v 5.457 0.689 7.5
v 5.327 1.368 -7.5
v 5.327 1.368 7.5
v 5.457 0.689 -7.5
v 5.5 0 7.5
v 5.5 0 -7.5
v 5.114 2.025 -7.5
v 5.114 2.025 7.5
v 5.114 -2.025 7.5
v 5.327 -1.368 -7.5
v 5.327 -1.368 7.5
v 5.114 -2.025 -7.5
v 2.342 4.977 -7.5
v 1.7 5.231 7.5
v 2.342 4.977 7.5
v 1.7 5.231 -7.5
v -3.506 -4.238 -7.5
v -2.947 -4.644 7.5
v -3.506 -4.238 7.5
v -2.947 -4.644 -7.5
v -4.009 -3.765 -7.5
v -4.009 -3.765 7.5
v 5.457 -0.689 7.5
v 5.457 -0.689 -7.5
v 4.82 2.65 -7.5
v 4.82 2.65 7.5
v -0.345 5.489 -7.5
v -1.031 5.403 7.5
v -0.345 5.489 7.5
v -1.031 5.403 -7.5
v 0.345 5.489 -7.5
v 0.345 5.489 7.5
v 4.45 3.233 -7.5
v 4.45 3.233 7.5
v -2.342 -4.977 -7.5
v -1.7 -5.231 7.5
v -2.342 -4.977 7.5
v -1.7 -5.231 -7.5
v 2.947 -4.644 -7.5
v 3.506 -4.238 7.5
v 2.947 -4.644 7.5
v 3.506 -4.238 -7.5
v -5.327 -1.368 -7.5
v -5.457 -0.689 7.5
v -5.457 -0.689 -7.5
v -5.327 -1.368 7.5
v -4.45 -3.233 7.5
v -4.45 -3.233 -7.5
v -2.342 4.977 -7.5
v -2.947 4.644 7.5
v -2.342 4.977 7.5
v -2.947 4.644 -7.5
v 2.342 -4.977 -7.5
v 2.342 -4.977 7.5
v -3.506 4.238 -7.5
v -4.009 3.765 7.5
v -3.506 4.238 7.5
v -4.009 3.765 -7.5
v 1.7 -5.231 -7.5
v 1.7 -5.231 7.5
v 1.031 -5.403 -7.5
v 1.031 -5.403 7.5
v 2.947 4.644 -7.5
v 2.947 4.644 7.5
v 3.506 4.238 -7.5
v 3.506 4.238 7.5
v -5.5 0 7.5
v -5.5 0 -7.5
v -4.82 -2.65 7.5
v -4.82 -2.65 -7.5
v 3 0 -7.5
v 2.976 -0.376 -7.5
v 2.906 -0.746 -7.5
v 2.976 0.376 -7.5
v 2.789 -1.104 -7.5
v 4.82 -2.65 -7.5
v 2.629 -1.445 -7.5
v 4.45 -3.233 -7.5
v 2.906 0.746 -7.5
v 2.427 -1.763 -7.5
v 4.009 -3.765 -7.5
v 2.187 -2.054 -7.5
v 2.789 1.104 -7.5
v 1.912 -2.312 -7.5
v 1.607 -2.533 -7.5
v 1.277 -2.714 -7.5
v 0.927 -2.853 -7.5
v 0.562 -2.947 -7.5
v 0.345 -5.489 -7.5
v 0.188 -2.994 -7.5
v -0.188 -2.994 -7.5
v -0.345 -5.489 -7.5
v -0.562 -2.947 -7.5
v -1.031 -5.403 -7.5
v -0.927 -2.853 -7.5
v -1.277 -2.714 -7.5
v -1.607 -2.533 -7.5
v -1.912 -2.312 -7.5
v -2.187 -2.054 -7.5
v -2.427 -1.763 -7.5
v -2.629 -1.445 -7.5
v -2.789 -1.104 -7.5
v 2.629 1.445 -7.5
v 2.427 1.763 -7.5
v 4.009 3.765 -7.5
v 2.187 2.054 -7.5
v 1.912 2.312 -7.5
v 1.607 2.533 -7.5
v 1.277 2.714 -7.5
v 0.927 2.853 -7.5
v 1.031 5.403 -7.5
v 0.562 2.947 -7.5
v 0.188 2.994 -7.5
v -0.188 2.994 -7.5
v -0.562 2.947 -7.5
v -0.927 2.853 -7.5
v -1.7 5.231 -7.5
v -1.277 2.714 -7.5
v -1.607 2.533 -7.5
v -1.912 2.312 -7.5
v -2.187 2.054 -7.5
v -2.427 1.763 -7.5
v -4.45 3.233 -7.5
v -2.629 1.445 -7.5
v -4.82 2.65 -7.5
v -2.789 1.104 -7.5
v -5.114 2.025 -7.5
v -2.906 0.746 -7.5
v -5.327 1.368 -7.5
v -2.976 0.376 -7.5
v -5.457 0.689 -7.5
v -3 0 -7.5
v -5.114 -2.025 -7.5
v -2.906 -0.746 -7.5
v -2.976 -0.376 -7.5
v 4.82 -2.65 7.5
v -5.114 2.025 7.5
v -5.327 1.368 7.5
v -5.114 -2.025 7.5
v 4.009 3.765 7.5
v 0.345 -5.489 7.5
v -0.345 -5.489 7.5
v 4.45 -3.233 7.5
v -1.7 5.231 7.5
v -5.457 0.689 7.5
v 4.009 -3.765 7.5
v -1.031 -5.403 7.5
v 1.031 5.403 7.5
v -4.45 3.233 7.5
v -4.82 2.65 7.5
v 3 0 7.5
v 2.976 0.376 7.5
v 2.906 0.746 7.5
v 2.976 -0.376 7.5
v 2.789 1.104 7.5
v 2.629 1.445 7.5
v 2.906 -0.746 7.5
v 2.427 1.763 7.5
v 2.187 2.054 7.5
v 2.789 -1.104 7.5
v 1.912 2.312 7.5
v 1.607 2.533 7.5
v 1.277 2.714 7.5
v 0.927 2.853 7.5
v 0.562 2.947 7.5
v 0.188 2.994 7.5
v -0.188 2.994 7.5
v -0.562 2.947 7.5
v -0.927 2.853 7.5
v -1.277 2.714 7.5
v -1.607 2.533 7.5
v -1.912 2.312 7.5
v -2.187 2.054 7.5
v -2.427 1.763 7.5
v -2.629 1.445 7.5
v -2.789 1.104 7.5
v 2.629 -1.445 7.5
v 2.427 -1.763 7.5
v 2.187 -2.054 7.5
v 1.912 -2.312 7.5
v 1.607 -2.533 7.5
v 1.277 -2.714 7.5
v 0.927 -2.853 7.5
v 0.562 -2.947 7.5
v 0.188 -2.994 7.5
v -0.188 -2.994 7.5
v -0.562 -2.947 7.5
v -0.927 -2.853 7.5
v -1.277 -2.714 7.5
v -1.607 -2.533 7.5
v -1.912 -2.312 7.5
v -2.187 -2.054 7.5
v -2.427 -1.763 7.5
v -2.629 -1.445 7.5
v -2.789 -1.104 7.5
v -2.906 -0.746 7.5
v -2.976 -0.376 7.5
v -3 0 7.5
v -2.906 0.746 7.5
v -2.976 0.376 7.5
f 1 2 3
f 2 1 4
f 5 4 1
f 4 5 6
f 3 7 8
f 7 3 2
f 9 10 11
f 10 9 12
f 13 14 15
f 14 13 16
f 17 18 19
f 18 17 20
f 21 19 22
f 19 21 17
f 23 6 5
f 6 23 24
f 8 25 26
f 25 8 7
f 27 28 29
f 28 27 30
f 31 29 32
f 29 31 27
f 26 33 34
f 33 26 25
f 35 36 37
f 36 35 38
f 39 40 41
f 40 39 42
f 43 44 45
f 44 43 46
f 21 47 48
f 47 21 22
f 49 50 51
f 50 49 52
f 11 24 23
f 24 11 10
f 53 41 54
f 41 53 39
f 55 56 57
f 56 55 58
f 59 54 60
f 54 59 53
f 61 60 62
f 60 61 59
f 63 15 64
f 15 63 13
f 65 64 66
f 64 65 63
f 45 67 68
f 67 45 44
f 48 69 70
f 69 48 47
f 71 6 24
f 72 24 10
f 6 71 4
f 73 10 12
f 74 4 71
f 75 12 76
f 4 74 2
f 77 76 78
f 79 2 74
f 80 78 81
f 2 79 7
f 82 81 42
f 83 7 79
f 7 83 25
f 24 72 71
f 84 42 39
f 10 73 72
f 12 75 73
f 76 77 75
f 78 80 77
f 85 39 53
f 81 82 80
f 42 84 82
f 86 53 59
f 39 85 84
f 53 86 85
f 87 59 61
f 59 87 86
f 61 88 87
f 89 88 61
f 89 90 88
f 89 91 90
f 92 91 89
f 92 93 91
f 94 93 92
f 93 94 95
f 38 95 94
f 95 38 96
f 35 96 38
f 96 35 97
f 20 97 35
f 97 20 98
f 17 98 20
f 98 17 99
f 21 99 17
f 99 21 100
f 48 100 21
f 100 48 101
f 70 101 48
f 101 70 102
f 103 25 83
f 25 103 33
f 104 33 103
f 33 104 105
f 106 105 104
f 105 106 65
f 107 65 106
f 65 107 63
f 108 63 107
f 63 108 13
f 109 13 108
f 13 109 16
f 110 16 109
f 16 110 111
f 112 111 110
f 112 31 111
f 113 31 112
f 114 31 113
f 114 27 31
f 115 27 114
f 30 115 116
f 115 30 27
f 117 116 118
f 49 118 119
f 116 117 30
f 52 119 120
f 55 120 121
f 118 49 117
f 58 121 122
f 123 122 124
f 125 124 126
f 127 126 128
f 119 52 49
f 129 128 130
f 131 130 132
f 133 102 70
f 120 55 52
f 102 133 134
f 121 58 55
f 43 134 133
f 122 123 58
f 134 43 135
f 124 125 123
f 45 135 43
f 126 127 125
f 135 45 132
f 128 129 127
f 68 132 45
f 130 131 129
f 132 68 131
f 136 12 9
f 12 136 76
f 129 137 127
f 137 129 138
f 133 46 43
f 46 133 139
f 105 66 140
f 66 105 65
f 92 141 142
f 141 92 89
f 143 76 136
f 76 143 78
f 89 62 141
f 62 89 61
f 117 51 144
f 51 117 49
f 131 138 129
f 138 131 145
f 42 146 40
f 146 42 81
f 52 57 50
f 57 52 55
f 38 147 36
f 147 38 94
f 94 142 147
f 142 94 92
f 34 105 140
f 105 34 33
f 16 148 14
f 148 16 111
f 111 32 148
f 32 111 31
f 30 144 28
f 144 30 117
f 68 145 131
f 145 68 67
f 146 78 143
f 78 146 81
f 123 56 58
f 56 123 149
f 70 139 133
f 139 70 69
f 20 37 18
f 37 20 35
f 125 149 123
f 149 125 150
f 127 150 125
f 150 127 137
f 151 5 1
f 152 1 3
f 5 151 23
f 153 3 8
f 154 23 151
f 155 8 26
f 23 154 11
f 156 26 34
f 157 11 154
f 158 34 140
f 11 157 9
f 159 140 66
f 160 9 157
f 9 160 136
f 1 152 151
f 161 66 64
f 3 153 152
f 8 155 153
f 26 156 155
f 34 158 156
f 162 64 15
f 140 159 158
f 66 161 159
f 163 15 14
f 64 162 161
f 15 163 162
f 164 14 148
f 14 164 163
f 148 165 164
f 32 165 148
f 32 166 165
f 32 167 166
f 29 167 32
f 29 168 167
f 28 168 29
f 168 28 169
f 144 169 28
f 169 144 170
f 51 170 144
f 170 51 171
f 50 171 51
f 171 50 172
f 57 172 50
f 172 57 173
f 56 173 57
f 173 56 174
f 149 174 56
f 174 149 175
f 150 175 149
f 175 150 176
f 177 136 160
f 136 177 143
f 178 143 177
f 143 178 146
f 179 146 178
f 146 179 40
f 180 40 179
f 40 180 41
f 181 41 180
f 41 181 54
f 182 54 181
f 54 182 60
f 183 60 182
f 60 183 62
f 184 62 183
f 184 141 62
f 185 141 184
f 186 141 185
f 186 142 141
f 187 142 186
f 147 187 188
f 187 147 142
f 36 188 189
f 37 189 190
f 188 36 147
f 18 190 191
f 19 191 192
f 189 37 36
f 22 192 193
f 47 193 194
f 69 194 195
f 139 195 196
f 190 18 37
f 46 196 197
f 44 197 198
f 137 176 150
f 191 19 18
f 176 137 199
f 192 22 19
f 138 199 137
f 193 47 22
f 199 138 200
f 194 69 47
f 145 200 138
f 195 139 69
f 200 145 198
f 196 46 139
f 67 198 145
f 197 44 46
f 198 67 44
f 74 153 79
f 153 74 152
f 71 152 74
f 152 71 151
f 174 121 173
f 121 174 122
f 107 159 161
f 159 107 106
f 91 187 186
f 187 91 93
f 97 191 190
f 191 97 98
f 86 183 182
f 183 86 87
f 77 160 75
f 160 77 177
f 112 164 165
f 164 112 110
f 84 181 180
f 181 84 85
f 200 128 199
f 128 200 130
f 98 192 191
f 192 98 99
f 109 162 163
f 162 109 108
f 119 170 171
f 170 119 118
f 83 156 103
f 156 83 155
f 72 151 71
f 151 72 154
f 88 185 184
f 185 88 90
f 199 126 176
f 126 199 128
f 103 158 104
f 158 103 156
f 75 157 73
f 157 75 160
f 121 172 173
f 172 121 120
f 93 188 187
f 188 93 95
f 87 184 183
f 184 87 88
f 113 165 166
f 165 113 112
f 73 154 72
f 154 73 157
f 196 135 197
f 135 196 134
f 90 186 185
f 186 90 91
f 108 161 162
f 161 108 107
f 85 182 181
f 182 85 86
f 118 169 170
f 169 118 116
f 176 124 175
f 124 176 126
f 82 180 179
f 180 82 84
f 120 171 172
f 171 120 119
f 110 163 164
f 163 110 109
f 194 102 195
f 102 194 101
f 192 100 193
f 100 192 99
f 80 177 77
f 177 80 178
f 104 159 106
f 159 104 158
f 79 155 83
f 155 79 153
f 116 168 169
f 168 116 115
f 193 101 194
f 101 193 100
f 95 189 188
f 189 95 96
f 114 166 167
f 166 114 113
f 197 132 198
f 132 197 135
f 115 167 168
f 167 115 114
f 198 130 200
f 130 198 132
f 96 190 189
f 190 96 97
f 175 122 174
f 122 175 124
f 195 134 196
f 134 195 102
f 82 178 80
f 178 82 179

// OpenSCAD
$fn = 50;


difference() {
	union() {
		translate(v = [0, 0, -7.5000000000]) {
			cylinder(h = 15, r = 5.5000000000);
		}
	}
	union() {
		translate(v = [0, 0, -100.0000000000]) {
			cylinder(h = 200, r = 3.0000000000);
		}
	}
}
